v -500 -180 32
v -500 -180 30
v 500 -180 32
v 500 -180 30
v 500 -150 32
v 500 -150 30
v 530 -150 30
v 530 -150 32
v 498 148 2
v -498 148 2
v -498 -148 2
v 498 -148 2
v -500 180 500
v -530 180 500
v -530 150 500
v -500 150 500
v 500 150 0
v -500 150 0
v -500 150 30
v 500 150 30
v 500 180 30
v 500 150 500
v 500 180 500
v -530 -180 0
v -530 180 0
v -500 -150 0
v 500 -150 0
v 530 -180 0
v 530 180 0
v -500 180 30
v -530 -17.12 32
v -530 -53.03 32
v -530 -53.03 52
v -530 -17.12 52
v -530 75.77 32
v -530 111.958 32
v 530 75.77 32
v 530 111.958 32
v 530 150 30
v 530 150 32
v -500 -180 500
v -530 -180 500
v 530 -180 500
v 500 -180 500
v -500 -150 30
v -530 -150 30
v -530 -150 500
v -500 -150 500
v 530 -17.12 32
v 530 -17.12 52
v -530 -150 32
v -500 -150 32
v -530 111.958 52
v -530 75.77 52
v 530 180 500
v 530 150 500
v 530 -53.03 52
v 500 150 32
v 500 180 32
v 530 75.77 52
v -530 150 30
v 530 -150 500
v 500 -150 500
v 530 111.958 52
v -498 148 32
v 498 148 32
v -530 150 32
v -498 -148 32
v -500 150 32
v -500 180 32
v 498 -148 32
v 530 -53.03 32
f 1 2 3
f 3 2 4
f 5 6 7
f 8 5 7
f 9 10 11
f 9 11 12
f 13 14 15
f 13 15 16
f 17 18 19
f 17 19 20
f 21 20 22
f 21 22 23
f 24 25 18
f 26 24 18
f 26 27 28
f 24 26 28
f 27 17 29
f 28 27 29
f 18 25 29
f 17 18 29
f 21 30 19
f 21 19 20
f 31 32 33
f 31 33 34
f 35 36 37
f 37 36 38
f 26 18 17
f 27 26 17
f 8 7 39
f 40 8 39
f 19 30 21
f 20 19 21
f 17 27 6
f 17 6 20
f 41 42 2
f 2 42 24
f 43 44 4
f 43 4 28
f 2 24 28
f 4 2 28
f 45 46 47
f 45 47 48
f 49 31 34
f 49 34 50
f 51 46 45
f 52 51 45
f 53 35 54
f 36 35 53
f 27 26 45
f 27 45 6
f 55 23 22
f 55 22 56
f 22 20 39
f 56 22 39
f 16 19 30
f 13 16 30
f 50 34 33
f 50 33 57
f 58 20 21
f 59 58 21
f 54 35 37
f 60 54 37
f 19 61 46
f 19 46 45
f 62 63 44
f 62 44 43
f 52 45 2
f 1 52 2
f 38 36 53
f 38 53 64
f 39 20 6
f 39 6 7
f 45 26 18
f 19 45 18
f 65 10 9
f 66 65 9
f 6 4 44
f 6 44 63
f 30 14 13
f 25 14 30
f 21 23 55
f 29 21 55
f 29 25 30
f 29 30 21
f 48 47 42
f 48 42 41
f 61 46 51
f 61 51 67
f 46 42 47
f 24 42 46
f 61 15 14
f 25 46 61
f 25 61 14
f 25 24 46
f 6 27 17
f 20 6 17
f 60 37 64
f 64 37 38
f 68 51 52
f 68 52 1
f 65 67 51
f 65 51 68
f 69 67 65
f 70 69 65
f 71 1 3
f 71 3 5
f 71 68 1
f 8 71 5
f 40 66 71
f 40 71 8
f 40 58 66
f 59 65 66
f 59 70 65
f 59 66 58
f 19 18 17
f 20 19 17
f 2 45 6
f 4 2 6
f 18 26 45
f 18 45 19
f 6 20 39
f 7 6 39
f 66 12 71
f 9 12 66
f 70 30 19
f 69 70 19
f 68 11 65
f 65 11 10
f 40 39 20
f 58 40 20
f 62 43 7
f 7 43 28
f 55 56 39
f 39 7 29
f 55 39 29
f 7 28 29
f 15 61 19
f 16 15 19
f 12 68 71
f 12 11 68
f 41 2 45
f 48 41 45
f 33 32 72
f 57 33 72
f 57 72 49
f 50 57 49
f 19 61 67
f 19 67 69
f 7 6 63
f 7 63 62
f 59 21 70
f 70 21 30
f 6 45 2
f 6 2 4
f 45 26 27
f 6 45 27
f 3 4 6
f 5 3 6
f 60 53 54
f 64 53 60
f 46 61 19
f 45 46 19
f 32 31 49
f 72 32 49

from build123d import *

# Parameters (mm, degrees)
F0_W     = 1000
F0_H     = 30
F1_DEPTH = 30
F0_W_2   = 30
F0_H_2   = 300
F2_DEPTH = 500
F3_DEPTH = 30
F4_T     = -2
F5_W     = 30
F5_H     = 300
F5_W_2   = 996
F5_H_2   = 296
F6_DEPTH = 2
F7_W     = 1060
F7_H     = 36.1880250275
F8_DEPTH = 20
F7_H_2   = 35.9093956649


with BuildPart() as f1:
    # F0 (on Top) → F1 (new body)
    with BuildSketch(Plane.XY):
        with Locations((0, 165)):
            Rectangle(F0_W, F0_H)
    extrude(amount=F1_DEPTH)



with BuildPart() as f1b:
    # F0 (on Top) → F1, piece 2 (new body)
    with BuildSketch(Plane.XY):
        with Locations((-515, 0)):
            Rectangle(F0_W_2, F0_H_2)
    extrude(amount=F1_DEPTH)


with BuildPart() as f1c:
    # F0 (on Top) → F1, piece 3 (new body)
    with BuildSketch(Plane.XY):
        with Locations((0, -165)):
            Rectangle(F0_W, F0_H)
    extrude(amount=F1_DEPTH)


with BuildPart() as f1d:
    # F0 (on Top) → F1, piece 4 (new body)
    with BuildSketch(Plane.XY):
        with Locations((515, 0)):
            Rectangle(F0_W_2, F0_H_2)
    extrude(amount=F1_DEPTH)


with BuildPart() as f1_1:
    add(f1.part)

    add(f1b.part)  # F2 merges F1b

    add(f1c.part)  # F2 merges F1c

    add(f1d.part)  # F2 merges F1d
    # F0 (on Top) → F2 (join)
    with BuildSketch(Plane.XY):
        with Locations((-515, 165)):
            Rectangle(F0_W_2, F0_H)
        with Locations((-515, -165)):
            Rectangle(F0_W_2, F0_H)
        with Locations((515, -165)):
            Rectangle(F0_W_2, F0_H)
        with Locations((515, 165)):
            Rectangle(F0_W_2, F0_H)
    extrude(amount=F2_DEPTH)


with BuildPart() as f3:
    # F0 (on Top) → F3 (new body)
    with BuildSketch(Plane.XY):
        Rectangle(F0_W, F0_H_2)
    extrude(amount=F3_DEPTH)

    # F4
    f4_openings = [f3.faces().sort_by_distance(p)[0] for p in [
        (0, 0, 30),
    ]]
    offset(amount=F4_T, openings=f4_openings)

    # F5 (on face) → F6 (join)
    with BuildSketch(Plane.XY.offset(30)):
        with Locations((-515, 0)):
            Rectangle(F5_W, F5_H)
        Polygon((-500, 180), (-500, 150), (-500, -150), (-500, -180), (500, -180), (500, -150), (530, -150), (530, 150), (500, 150), (500, 180), align=None)
        Rectangle(F5_W_2, F5_H_2, mode=Mode.SUBTRACT)
    extrude(amount=F6_DEPTH)


with BuildPart() as f8:
    # F7 (on face) → F8 (new body)
    with BuildSketch(Plane.XY.offset(32)):
        with Locations((0, 93.8637312502)):
            Rectangle(F7_W, F7_H)
    extrude(amount=F8_DEPTH)


with BuildPart() as f8b:
    # F7 (on face) → F8, piece 2 (new body)
    with BuildSketch(Plane.XY.offset(32)):
        with Locations((0, -35.0748170167)):
            Rectangle(F7_W, F7_H_2)
    extrude(amount=F8_DEPTH)


solid = Compound([f1_1.part, f3.part, f8.part, f8b.part])
